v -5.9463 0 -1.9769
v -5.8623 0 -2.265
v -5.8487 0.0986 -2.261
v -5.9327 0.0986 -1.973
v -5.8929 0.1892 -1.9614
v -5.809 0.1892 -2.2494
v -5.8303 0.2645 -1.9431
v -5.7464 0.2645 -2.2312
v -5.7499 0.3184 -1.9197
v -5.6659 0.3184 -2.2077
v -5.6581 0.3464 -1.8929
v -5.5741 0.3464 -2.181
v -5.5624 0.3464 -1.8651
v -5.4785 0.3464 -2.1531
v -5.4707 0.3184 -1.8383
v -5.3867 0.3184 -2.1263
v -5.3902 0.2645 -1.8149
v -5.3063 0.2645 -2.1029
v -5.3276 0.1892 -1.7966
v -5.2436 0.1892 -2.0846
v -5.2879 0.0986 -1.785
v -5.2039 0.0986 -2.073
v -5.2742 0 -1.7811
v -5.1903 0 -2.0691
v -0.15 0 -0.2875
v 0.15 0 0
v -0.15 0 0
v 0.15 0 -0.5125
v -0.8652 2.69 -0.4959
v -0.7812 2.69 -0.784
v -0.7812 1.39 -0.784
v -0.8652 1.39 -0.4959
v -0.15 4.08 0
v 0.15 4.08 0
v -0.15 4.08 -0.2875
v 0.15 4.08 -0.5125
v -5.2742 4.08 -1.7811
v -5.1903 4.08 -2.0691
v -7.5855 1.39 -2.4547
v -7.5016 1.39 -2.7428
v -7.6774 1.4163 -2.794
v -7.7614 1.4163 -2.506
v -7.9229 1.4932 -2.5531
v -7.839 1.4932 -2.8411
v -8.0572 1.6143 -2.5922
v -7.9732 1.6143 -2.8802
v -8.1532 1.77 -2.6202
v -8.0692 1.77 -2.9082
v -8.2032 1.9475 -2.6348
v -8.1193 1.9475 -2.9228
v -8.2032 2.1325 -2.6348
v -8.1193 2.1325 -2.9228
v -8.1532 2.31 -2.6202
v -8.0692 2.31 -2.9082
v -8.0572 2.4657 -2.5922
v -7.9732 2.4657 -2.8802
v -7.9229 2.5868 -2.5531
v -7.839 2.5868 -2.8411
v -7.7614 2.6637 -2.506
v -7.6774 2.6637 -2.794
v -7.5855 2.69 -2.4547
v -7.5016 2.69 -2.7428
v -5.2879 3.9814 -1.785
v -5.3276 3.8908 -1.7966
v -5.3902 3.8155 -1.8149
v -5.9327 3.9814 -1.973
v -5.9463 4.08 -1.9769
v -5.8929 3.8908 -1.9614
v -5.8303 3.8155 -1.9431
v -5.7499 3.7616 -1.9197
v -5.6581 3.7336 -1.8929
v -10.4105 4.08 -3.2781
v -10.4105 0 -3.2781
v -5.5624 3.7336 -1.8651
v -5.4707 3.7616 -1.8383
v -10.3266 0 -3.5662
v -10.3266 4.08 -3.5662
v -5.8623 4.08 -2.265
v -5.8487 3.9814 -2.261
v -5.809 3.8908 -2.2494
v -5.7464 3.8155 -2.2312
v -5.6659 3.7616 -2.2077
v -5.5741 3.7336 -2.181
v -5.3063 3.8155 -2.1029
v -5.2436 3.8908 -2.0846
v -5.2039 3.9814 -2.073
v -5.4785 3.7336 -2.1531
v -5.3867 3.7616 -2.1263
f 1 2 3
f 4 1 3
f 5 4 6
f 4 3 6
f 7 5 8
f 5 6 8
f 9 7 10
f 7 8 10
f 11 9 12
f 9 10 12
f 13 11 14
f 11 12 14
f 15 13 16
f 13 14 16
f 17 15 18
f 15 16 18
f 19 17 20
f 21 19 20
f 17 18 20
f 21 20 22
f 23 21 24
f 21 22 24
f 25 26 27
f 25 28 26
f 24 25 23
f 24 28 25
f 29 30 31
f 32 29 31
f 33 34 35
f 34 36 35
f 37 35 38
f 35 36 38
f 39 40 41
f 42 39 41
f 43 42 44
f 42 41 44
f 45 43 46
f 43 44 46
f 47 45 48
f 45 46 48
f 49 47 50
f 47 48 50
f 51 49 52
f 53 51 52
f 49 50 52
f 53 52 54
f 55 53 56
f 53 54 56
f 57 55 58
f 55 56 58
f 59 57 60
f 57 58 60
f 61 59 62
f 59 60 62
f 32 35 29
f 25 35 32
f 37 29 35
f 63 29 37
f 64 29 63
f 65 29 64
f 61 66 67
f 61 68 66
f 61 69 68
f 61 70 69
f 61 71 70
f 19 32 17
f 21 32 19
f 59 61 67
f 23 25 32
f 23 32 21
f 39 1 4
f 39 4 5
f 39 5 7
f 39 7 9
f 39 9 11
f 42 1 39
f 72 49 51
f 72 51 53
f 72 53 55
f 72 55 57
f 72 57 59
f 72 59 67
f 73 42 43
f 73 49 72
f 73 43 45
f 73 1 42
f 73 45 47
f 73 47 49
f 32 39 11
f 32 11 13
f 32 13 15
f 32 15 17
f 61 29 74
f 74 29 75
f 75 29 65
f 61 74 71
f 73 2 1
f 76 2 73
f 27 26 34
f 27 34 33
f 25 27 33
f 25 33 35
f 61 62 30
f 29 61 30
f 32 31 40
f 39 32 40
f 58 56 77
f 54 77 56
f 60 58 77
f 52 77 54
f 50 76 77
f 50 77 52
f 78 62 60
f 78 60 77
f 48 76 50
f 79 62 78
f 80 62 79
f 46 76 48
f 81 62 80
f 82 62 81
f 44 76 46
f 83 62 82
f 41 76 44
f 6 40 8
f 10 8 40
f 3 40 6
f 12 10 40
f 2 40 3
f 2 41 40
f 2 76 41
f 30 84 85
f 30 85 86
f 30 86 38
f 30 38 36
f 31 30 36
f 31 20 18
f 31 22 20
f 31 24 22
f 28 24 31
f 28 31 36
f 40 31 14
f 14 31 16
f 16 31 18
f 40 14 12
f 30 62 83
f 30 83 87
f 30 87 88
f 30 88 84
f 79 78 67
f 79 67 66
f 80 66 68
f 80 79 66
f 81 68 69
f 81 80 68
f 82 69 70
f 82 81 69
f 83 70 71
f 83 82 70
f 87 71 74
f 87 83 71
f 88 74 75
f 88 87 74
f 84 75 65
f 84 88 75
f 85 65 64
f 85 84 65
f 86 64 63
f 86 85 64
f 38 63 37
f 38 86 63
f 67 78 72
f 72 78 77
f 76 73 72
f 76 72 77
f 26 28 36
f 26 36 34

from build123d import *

# Parameters (mm, degrees)
BOSS_EXTRUDE1_DEPTH = 4.08
CUT_EXTRUDE1_DEPTH  = 0.3
CUT_EXTRUDE2_DEPTH  = 0.3


with BuildPart() as part:
    # Sketch1 → Boss-Extrude1 (new body)
    with BuildSketch(Plane(origin=(0, 0, 0), x_dir=(1, 0, 0), z_dir=(0, 1, 0))):
        Polygon((-0.15, 0), (-0.15, 0.287479127), (-10.410512779, 3.278145873), (-10.326564075, 3.56616083), (0.15, 0.512520873), (0.15, 0), align=None)
    extrude(amount=BOSS_EXTRUDE1_DEPTH)

    # Sketch2 → Cut-Extrude1 (cut)
    with BuildSketch(Plane(origin=(0.149434274, 0, -0.512685767), x_dir=(-0.9600498543859305, 0, -0.2798290140309858), z_dir=(0.2798290140309858, 0, -0.9600498543859306))):
        with BuildLine():
            Line((0.969410732, 1.39), (7.969410732, 1.39))
            ThreePointArc((7.969410732, 1.39), (8.619410732, 2.04), (7.969410732, 2.69))
            Line((7.969410732, 2.69), (0.969410732, 2.69))
            Line((0.969410732, 2.69), (0.969410732, 1.39))
        make_face()
    extrude(amount=-CUT_EXTRUDE1_DEPTH, mode=Mode.SUBTRACT)

    # Sketch3 → Cut-Extrude2 (cut)
    with BuildSketch(Plane(origin=(0.149434274, 0, -0.512685767), x_dir=(-0.9600498543859305, 0, -0.2798290140309858), z_dir=(0.2798290140309858, 0, -0.9600498543859306))):
        with BuildLine():
            Line((5.561931606, 4.08), (6.261931606, 4.08))
            ThreePointArc((6.261931606, 4.08), (5.911931606, 3.73), (5.561931606, 4.08))
        make_face()
        with BuildLine():
            Line((5.561931606, 0), (6.261931606, 0))
            ThreePointArc((6.261931606, 0), (5.911931606, 0.35), (5.561931606, 0))
        make_face()
    extrude(amount=-CUT_EXTRUDE2_DEPTH, mode=Mode.SUBTRACT)


solid = part.part
